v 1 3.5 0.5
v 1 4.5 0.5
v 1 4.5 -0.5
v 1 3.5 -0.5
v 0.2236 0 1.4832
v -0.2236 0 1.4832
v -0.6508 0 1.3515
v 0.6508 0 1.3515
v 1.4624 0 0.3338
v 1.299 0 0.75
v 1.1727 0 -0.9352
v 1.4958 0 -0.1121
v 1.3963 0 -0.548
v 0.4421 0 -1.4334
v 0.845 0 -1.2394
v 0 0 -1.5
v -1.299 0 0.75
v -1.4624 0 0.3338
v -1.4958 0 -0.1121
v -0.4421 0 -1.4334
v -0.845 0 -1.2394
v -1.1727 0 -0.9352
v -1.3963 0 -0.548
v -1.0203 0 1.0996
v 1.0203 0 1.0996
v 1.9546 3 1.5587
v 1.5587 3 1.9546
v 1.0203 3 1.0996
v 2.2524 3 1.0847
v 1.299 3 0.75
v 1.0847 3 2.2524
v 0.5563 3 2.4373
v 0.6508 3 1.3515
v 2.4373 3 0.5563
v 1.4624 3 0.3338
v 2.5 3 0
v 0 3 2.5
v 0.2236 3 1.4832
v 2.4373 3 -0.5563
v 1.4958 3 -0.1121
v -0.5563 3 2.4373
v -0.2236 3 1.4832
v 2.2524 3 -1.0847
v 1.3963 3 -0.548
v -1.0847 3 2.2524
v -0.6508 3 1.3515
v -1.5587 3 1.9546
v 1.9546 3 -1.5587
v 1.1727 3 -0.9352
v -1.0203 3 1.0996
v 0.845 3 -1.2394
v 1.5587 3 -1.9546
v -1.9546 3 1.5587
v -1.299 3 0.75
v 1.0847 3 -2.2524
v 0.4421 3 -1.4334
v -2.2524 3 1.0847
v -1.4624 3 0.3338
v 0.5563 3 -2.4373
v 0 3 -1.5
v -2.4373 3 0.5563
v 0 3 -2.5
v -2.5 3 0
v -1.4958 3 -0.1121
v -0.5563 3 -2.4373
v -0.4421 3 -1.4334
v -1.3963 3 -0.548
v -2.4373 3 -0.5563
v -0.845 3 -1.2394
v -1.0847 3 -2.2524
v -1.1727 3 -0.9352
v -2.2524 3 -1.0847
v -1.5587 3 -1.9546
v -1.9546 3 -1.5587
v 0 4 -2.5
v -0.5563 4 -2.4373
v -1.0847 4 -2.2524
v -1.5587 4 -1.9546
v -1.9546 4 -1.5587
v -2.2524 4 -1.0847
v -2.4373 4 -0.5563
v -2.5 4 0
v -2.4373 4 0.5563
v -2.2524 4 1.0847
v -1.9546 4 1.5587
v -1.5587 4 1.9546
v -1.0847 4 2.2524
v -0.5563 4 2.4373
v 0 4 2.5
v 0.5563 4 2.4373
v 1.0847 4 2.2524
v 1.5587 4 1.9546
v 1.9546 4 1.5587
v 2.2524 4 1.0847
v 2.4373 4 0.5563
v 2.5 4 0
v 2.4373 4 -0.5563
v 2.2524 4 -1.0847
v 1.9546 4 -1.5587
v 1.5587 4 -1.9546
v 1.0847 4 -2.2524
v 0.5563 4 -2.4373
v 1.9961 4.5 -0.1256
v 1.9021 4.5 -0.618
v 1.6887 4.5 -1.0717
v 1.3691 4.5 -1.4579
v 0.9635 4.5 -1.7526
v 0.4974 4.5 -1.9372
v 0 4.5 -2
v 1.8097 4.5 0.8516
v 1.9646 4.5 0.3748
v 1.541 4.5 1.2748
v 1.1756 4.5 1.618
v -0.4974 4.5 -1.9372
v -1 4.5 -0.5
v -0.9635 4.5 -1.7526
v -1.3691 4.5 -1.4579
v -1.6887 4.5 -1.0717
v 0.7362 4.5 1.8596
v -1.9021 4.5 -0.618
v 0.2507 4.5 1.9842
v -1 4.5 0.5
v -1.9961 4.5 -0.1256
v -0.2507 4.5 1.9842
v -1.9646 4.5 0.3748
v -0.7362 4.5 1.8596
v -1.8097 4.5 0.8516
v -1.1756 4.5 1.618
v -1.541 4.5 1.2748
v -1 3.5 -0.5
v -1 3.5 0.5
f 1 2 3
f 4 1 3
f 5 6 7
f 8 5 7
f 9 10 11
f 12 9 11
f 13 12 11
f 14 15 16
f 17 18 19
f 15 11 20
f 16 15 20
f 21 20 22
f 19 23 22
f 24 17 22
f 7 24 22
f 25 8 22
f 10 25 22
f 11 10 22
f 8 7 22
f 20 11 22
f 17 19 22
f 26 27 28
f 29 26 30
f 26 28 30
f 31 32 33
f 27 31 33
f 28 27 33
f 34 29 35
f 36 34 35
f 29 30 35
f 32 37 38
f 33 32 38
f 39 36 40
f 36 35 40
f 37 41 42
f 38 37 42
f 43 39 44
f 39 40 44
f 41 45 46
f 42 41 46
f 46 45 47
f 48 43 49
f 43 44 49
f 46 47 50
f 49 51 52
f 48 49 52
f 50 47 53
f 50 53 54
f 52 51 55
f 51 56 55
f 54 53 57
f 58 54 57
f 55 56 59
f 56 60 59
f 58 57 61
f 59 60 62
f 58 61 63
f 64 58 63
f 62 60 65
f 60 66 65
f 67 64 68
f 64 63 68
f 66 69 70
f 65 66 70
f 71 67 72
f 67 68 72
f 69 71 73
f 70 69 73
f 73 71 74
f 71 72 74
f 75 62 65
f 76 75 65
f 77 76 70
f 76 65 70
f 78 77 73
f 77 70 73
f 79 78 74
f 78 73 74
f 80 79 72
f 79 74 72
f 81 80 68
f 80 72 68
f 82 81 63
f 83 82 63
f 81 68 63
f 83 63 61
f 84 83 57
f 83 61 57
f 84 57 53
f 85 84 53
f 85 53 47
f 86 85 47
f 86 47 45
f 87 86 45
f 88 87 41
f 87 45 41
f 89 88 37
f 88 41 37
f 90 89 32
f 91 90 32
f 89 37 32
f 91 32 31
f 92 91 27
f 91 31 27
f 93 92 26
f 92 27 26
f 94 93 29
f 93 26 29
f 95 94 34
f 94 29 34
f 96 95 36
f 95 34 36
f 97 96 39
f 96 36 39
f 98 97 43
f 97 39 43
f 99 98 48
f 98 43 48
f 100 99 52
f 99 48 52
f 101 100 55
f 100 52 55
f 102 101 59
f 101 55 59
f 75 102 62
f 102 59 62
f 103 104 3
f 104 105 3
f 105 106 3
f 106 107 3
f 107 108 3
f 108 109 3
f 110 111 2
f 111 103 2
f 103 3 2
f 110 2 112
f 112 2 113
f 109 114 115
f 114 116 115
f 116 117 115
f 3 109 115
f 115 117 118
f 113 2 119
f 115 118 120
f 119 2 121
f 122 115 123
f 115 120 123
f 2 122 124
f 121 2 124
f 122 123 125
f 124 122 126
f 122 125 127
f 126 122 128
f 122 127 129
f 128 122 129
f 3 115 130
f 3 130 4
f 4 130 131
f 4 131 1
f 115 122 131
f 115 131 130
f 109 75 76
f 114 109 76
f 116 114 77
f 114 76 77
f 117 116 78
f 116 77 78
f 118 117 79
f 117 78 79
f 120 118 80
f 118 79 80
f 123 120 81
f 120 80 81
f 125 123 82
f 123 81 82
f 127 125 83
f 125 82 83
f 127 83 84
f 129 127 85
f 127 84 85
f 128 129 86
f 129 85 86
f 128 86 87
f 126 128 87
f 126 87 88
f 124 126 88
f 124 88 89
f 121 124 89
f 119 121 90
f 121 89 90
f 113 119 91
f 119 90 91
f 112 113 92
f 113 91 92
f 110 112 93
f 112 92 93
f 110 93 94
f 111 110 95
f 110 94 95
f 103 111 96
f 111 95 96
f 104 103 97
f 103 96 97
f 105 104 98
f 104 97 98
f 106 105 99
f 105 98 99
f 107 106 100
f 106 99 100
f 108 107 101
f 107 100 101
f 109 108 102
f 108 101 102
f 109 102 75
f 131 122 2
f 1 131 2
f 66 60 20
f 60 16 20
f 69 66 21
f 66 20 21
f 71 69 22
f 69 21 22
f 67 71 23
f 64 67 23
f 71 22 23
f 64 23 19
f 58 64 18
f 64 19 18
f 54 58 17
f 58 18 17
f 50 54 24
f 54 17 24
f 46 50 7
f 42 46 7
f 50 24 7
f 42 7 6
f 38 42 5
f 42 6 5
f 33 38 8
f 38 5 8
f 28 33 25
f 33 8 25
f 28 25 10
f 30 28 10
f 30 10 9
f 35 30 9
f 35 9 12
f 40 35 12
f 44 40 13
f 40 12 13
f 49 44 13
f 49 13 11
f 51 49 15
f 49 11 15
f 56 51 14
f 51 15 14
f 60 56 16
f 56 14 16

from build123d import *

# Parameters (mm, degrees)
CHAMFER1_SIZE      = 0.5
SKETCH2_W          = 2
SKETCH2_H          = 1
CUT_EXTRUDE1_DEPTH = 1


with BuildPart() as part:
    # Sketch1 → Revolve1 (revolve)
    with BuildSketch(Plane.XY, mode=Mode.PRIVATE) as revolve1_sk:
        Polygon((0, 3.5), (-0.5, 3.5), (-0.5, 4.5), (-2.5, 4.5), (-2.5, 3), (-1.5, 3), (-1.5, 0), (0, 0), align=None)
    revolve(revolve1_sk.sketch.rotate(Axis((0, 0, 0), (0, 1, 0)), 270), axis=Axis((0, 0, 0), (0, 1, 0)))

    # Chamfer1
    chamfer1_edges = [part.edges().sort_by_distance(p)[0] for p in [
        (0, 4.5, 2.5),
    ]]
    chamfer(chamfer1_edges, length=CHAMFER1_SIZE)

    # Sketch2 → Cut-Extrude1 (cut)
    with BuildSketch(Plane(origin=(0, 4.5, 0), x_dir=(1, 0, 0), z_dir=(0, 1, 0))):
        Rectangle(SKETCH2_W, SKETCH2_H)
    extrude(amount=-CUT_EXTRUDE1_DEPTH, mode=Mode.SUBTRACT)


solid = part.part
